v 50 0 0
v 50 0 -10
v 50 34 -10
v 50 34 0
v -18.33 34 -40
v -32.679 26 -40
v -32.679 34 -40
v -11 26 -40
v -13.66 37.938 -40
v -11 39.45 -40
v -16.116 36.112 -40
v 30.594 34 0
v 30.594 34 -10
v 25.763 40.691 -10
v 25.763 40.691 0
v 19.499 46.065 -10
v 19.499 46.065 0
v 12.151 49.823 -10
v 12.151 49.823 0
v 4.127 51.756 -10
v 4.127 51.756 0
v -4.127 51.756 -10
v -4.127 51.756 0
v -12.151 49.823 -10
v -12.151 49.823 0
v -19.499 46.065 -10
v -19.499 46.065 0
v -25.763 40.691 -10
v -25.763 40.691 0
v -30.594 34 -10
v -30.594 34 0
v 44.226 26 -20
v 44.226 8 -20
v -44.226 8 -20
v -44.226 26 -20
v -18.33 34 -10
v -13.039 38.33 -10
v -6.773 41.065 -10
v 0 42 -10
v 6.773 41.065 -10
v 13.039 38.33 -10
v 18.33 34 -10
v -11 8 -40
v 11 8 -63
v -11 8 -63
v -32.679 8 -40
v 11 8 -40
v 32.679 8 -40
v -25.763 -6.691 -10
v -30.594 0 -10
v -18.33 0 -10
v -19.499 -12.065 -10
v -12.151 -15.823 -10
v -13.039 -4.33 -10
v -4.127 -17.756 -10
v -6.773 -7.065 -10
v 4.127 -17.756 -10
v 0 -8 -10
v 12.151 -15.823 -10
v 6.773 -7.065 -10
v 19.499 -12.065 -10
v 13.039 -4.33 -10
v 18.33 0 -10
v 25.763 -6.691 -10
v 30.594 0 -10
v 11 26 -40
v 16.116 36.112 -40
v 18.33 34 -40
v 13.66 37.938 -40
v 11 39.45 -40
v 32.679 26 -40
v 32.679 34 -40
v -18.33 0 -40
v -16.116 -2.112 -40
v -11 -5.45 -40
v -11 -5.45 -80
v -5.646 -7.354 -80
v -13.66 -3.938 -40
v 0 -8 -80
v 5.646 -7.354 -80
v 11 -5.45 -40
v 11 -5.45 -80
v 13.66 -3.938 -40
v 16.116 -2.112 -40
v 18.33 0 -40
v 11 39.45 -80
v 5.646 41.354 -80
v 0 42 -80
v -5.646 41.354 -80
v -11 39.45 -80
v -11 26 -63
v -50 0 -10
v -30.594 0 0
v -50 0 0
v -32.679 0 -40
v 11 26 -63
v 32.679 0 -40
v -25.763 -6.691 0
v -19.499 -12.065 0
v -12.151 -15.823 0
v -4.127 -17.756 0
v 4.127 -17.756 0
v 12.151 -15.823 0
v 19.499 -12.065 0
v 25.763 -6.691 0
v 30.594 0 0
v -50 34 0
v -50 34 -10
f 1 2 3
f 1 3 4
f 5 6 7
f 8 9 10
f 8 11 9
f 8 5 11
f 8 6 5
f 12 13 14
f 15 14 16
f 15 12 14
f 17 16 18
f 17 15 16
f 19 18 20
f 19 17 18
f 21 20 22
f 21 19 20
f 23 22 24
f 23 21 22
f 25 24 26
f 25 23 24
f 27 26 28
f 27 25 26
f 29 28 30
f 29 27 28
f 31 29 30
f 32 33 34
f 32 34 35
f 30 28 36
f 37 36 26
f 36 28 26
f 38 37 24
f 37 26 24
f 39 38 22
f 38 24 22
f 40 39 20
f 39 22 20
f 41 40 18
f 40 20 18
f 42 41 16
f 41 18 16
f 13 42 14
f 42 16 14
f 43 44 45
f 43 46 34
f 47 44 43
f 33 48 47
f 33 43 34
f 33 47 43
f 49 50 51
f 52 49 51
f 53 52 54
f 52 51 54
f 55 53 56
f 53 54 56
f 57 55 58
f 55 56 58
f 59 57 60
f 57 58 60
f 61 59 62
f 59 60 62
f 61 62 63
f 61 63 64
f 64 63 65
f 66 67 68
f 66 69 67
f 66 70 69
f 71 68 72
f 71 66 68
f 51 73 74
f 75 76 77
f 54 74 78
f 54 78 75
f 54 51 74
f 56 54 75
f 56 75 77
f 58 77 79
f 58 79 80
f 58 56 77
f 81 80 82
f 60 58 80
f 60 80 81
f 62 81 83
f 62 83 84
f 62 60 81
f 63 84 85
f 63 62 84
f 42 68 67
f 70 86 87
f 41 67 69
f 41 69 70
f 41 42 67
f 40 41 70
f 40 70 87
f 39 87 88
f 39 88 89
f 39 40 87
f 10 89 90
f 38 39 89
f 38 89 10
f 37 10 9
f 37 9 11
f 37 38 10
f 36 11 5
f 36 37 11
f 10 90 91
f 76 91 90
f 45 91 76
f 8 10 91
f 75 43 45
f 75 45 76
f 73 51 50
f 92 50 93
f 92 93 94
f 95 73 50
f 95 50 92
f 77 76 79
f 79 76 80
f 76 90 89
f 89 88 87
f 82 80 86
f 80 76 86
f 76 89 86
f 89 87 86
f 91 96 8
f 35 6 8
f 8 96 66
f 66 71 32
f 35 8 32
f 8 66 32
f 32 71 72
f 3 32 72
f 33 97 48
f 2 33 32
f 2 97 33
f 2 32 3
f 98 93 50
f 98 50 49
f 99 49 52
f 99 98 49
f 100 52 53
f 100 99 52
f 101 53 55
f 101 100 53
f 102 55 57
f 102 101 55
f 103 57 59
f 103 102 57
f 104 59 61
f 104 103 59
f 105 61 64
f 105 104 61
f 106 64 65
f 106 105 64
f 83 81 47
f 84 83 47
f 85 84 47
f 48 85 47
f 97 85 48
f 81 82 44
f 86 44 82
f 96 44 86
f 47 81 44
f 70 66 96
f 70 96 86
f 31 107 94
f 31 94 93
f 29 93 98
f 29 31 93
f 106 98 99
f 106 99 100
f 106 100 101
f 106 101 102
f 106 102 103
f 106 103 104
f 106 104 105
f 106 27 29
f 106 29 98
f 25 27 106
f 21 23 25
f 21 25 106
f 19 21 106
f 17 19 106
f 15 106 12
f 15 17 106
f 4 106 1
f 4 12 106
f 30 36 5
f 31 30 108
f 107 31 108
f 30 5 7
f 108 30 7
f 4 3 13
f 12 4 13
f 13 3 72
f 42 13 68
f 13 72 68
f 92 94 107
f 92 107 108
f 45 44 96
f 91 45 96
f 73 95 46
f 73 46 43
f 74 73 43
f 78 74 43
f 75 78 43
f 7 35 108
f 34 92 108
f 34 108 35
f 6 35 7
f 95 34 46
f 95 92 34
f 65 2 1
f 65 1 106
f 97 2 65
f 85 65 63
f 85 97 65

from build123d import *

# Parameters (mm, degrees)
BOSS_EXTRUDE1_DEPTH     = 34
SKETCH2_R               = 35
BOSS_EXTRUDE2_DEPTH     = 10
SKETCH3_R               = 25
BOSS_EXTRUDE3_DEPTH     = 80
CUT_EXTRUDE2_START      = -40
CUT_EXTRUDE2_DEPTH      = 40
CUT_EXTRUDE5_DEPTH      = 114.247516529
CUT_EXTRUDE5_DEPTH_BACK = 114.247516529
SKETCH11_W              = 43
SKETCH11_H              = 18


with BuildPart() as part:
    # Sketch1 → Boss-Extrude1 (new body)
    with BuildSketch(Plane(origin=(0, 0, 0), x_dir=(1, 0, 0), z_dir=(0, 1, 0))):
        Polygon((50, 0), (-50, 0), (-50, 10), (-32.679491924, 40), (32.679491924, 40), (50, 10), align=None)
    extrude(amount=BOSS_EXTRUDE1_DEPTH)

    # Sketch2 → Boss-Extrude2 (add)
    with BuildSketch(Plane.XY):
        with Locations((0, 17)):
            Circle(SKETCH2_R)
    extrude(amount=-BOSS_EXTRUDE2_DEPTH)

    # Sketch3 → Boss-Extrude3 (add)
    with BuildSketch(Plane.XY):
        with Locations((0, 17)):
            Circle(SKETCH3_R)
    extrude(amount=-BOSS_EXTRUDE3_DEPTH)

    # Sketch5 → Cut-Extrude2 (cut)
    with BuildSketch(Plane(origin=(0, 0, -80), x_dir=(-1, 0, 0), z_dir=(0, 0, -1)).offset(CUT_EXTRUDE2_START)):
        with BuildLine():
            ThreePointArc((-25, 17.00000011), (-21.213203465, 3.771243492), (-11, -5.449944321))
            Line((-11, -5.449944321), (-11, 39.449944321))
            ThreePointArc((-11, 39.449944321), (-21.213203406, 30.228756602), (-25, 17.00000011))
        make_face()
        with BuildLine():
            ThreePointArc((-25, 17.00000011), (-21.213203406, 30.228756602), (-11, 39.449944321))
            Line((-11, 39.449944321), (-11, 52))
            Line((-11, 52), (-25, 52))
            Line((-25, 52), (-25, 17.00000011))
        make_face()
        with BuildLine():
            Line((-25, -18), (-11, -18))
            Line((-11, -18), (-11, -5.449944321))
            ThreePointArc((-11, -5.449944321), (-21.213203465, 3.771243492), (-25, 17.00000011))
            Line((-25, 17.00000011), (-25, -18))
        make_face()
        with BuildLine():
            ThreePointArc((25, 17), (21.213203436, 3.771243445), (11, -5.449944321))
            Line((11, -5.449944321), (11, -18))
            Line((11, -18), (25, -18))
            Line((25, -18), (25, 17))
        make_face()
        with BuildLine():
            Line((11, 39.449944321), (11, -5.449944321))
            ThreePointArc((11, -5.449944321), (21.213203436, 3.771243445), (25, 17))
            ThreePointArc((25, 17), (21.213203436, 30.228756555), (11, 39.449944321))
        make_face()
        with BuildLine():
            Line((11, 52), (11, 39.449944321))
            ThreePointArc((11, 39.449944321), (21.213203436, 30.228756555), (25, 17))
            Line((25, 17), (25, 52))
            Line((25, 52), (11, 52))
        make_face()
    extrude(amount=CUT_EXTRUDE2_DEPTH, mode=Mode.SUBTRACT)

    # Sketch11 → Cut-Extrude5 (cut, two sides: drawn at the far end of the back side and taken through both)
    with BuildSketch(Plane.ZY.offset(11).offset(-CUT_EXTRUDE5_DEPTH_BACK)):
        with Locations((-41.5, 17)):
            Rectangle(SKETCH11_W, SKETCH11_H)
    extrude(amount=CUT_EXTRUDE5_DEPTH + CUT_EXTRUDE5_DEPTH_BACK, mode=Mode.SUBTRACT)


solid = part.part
